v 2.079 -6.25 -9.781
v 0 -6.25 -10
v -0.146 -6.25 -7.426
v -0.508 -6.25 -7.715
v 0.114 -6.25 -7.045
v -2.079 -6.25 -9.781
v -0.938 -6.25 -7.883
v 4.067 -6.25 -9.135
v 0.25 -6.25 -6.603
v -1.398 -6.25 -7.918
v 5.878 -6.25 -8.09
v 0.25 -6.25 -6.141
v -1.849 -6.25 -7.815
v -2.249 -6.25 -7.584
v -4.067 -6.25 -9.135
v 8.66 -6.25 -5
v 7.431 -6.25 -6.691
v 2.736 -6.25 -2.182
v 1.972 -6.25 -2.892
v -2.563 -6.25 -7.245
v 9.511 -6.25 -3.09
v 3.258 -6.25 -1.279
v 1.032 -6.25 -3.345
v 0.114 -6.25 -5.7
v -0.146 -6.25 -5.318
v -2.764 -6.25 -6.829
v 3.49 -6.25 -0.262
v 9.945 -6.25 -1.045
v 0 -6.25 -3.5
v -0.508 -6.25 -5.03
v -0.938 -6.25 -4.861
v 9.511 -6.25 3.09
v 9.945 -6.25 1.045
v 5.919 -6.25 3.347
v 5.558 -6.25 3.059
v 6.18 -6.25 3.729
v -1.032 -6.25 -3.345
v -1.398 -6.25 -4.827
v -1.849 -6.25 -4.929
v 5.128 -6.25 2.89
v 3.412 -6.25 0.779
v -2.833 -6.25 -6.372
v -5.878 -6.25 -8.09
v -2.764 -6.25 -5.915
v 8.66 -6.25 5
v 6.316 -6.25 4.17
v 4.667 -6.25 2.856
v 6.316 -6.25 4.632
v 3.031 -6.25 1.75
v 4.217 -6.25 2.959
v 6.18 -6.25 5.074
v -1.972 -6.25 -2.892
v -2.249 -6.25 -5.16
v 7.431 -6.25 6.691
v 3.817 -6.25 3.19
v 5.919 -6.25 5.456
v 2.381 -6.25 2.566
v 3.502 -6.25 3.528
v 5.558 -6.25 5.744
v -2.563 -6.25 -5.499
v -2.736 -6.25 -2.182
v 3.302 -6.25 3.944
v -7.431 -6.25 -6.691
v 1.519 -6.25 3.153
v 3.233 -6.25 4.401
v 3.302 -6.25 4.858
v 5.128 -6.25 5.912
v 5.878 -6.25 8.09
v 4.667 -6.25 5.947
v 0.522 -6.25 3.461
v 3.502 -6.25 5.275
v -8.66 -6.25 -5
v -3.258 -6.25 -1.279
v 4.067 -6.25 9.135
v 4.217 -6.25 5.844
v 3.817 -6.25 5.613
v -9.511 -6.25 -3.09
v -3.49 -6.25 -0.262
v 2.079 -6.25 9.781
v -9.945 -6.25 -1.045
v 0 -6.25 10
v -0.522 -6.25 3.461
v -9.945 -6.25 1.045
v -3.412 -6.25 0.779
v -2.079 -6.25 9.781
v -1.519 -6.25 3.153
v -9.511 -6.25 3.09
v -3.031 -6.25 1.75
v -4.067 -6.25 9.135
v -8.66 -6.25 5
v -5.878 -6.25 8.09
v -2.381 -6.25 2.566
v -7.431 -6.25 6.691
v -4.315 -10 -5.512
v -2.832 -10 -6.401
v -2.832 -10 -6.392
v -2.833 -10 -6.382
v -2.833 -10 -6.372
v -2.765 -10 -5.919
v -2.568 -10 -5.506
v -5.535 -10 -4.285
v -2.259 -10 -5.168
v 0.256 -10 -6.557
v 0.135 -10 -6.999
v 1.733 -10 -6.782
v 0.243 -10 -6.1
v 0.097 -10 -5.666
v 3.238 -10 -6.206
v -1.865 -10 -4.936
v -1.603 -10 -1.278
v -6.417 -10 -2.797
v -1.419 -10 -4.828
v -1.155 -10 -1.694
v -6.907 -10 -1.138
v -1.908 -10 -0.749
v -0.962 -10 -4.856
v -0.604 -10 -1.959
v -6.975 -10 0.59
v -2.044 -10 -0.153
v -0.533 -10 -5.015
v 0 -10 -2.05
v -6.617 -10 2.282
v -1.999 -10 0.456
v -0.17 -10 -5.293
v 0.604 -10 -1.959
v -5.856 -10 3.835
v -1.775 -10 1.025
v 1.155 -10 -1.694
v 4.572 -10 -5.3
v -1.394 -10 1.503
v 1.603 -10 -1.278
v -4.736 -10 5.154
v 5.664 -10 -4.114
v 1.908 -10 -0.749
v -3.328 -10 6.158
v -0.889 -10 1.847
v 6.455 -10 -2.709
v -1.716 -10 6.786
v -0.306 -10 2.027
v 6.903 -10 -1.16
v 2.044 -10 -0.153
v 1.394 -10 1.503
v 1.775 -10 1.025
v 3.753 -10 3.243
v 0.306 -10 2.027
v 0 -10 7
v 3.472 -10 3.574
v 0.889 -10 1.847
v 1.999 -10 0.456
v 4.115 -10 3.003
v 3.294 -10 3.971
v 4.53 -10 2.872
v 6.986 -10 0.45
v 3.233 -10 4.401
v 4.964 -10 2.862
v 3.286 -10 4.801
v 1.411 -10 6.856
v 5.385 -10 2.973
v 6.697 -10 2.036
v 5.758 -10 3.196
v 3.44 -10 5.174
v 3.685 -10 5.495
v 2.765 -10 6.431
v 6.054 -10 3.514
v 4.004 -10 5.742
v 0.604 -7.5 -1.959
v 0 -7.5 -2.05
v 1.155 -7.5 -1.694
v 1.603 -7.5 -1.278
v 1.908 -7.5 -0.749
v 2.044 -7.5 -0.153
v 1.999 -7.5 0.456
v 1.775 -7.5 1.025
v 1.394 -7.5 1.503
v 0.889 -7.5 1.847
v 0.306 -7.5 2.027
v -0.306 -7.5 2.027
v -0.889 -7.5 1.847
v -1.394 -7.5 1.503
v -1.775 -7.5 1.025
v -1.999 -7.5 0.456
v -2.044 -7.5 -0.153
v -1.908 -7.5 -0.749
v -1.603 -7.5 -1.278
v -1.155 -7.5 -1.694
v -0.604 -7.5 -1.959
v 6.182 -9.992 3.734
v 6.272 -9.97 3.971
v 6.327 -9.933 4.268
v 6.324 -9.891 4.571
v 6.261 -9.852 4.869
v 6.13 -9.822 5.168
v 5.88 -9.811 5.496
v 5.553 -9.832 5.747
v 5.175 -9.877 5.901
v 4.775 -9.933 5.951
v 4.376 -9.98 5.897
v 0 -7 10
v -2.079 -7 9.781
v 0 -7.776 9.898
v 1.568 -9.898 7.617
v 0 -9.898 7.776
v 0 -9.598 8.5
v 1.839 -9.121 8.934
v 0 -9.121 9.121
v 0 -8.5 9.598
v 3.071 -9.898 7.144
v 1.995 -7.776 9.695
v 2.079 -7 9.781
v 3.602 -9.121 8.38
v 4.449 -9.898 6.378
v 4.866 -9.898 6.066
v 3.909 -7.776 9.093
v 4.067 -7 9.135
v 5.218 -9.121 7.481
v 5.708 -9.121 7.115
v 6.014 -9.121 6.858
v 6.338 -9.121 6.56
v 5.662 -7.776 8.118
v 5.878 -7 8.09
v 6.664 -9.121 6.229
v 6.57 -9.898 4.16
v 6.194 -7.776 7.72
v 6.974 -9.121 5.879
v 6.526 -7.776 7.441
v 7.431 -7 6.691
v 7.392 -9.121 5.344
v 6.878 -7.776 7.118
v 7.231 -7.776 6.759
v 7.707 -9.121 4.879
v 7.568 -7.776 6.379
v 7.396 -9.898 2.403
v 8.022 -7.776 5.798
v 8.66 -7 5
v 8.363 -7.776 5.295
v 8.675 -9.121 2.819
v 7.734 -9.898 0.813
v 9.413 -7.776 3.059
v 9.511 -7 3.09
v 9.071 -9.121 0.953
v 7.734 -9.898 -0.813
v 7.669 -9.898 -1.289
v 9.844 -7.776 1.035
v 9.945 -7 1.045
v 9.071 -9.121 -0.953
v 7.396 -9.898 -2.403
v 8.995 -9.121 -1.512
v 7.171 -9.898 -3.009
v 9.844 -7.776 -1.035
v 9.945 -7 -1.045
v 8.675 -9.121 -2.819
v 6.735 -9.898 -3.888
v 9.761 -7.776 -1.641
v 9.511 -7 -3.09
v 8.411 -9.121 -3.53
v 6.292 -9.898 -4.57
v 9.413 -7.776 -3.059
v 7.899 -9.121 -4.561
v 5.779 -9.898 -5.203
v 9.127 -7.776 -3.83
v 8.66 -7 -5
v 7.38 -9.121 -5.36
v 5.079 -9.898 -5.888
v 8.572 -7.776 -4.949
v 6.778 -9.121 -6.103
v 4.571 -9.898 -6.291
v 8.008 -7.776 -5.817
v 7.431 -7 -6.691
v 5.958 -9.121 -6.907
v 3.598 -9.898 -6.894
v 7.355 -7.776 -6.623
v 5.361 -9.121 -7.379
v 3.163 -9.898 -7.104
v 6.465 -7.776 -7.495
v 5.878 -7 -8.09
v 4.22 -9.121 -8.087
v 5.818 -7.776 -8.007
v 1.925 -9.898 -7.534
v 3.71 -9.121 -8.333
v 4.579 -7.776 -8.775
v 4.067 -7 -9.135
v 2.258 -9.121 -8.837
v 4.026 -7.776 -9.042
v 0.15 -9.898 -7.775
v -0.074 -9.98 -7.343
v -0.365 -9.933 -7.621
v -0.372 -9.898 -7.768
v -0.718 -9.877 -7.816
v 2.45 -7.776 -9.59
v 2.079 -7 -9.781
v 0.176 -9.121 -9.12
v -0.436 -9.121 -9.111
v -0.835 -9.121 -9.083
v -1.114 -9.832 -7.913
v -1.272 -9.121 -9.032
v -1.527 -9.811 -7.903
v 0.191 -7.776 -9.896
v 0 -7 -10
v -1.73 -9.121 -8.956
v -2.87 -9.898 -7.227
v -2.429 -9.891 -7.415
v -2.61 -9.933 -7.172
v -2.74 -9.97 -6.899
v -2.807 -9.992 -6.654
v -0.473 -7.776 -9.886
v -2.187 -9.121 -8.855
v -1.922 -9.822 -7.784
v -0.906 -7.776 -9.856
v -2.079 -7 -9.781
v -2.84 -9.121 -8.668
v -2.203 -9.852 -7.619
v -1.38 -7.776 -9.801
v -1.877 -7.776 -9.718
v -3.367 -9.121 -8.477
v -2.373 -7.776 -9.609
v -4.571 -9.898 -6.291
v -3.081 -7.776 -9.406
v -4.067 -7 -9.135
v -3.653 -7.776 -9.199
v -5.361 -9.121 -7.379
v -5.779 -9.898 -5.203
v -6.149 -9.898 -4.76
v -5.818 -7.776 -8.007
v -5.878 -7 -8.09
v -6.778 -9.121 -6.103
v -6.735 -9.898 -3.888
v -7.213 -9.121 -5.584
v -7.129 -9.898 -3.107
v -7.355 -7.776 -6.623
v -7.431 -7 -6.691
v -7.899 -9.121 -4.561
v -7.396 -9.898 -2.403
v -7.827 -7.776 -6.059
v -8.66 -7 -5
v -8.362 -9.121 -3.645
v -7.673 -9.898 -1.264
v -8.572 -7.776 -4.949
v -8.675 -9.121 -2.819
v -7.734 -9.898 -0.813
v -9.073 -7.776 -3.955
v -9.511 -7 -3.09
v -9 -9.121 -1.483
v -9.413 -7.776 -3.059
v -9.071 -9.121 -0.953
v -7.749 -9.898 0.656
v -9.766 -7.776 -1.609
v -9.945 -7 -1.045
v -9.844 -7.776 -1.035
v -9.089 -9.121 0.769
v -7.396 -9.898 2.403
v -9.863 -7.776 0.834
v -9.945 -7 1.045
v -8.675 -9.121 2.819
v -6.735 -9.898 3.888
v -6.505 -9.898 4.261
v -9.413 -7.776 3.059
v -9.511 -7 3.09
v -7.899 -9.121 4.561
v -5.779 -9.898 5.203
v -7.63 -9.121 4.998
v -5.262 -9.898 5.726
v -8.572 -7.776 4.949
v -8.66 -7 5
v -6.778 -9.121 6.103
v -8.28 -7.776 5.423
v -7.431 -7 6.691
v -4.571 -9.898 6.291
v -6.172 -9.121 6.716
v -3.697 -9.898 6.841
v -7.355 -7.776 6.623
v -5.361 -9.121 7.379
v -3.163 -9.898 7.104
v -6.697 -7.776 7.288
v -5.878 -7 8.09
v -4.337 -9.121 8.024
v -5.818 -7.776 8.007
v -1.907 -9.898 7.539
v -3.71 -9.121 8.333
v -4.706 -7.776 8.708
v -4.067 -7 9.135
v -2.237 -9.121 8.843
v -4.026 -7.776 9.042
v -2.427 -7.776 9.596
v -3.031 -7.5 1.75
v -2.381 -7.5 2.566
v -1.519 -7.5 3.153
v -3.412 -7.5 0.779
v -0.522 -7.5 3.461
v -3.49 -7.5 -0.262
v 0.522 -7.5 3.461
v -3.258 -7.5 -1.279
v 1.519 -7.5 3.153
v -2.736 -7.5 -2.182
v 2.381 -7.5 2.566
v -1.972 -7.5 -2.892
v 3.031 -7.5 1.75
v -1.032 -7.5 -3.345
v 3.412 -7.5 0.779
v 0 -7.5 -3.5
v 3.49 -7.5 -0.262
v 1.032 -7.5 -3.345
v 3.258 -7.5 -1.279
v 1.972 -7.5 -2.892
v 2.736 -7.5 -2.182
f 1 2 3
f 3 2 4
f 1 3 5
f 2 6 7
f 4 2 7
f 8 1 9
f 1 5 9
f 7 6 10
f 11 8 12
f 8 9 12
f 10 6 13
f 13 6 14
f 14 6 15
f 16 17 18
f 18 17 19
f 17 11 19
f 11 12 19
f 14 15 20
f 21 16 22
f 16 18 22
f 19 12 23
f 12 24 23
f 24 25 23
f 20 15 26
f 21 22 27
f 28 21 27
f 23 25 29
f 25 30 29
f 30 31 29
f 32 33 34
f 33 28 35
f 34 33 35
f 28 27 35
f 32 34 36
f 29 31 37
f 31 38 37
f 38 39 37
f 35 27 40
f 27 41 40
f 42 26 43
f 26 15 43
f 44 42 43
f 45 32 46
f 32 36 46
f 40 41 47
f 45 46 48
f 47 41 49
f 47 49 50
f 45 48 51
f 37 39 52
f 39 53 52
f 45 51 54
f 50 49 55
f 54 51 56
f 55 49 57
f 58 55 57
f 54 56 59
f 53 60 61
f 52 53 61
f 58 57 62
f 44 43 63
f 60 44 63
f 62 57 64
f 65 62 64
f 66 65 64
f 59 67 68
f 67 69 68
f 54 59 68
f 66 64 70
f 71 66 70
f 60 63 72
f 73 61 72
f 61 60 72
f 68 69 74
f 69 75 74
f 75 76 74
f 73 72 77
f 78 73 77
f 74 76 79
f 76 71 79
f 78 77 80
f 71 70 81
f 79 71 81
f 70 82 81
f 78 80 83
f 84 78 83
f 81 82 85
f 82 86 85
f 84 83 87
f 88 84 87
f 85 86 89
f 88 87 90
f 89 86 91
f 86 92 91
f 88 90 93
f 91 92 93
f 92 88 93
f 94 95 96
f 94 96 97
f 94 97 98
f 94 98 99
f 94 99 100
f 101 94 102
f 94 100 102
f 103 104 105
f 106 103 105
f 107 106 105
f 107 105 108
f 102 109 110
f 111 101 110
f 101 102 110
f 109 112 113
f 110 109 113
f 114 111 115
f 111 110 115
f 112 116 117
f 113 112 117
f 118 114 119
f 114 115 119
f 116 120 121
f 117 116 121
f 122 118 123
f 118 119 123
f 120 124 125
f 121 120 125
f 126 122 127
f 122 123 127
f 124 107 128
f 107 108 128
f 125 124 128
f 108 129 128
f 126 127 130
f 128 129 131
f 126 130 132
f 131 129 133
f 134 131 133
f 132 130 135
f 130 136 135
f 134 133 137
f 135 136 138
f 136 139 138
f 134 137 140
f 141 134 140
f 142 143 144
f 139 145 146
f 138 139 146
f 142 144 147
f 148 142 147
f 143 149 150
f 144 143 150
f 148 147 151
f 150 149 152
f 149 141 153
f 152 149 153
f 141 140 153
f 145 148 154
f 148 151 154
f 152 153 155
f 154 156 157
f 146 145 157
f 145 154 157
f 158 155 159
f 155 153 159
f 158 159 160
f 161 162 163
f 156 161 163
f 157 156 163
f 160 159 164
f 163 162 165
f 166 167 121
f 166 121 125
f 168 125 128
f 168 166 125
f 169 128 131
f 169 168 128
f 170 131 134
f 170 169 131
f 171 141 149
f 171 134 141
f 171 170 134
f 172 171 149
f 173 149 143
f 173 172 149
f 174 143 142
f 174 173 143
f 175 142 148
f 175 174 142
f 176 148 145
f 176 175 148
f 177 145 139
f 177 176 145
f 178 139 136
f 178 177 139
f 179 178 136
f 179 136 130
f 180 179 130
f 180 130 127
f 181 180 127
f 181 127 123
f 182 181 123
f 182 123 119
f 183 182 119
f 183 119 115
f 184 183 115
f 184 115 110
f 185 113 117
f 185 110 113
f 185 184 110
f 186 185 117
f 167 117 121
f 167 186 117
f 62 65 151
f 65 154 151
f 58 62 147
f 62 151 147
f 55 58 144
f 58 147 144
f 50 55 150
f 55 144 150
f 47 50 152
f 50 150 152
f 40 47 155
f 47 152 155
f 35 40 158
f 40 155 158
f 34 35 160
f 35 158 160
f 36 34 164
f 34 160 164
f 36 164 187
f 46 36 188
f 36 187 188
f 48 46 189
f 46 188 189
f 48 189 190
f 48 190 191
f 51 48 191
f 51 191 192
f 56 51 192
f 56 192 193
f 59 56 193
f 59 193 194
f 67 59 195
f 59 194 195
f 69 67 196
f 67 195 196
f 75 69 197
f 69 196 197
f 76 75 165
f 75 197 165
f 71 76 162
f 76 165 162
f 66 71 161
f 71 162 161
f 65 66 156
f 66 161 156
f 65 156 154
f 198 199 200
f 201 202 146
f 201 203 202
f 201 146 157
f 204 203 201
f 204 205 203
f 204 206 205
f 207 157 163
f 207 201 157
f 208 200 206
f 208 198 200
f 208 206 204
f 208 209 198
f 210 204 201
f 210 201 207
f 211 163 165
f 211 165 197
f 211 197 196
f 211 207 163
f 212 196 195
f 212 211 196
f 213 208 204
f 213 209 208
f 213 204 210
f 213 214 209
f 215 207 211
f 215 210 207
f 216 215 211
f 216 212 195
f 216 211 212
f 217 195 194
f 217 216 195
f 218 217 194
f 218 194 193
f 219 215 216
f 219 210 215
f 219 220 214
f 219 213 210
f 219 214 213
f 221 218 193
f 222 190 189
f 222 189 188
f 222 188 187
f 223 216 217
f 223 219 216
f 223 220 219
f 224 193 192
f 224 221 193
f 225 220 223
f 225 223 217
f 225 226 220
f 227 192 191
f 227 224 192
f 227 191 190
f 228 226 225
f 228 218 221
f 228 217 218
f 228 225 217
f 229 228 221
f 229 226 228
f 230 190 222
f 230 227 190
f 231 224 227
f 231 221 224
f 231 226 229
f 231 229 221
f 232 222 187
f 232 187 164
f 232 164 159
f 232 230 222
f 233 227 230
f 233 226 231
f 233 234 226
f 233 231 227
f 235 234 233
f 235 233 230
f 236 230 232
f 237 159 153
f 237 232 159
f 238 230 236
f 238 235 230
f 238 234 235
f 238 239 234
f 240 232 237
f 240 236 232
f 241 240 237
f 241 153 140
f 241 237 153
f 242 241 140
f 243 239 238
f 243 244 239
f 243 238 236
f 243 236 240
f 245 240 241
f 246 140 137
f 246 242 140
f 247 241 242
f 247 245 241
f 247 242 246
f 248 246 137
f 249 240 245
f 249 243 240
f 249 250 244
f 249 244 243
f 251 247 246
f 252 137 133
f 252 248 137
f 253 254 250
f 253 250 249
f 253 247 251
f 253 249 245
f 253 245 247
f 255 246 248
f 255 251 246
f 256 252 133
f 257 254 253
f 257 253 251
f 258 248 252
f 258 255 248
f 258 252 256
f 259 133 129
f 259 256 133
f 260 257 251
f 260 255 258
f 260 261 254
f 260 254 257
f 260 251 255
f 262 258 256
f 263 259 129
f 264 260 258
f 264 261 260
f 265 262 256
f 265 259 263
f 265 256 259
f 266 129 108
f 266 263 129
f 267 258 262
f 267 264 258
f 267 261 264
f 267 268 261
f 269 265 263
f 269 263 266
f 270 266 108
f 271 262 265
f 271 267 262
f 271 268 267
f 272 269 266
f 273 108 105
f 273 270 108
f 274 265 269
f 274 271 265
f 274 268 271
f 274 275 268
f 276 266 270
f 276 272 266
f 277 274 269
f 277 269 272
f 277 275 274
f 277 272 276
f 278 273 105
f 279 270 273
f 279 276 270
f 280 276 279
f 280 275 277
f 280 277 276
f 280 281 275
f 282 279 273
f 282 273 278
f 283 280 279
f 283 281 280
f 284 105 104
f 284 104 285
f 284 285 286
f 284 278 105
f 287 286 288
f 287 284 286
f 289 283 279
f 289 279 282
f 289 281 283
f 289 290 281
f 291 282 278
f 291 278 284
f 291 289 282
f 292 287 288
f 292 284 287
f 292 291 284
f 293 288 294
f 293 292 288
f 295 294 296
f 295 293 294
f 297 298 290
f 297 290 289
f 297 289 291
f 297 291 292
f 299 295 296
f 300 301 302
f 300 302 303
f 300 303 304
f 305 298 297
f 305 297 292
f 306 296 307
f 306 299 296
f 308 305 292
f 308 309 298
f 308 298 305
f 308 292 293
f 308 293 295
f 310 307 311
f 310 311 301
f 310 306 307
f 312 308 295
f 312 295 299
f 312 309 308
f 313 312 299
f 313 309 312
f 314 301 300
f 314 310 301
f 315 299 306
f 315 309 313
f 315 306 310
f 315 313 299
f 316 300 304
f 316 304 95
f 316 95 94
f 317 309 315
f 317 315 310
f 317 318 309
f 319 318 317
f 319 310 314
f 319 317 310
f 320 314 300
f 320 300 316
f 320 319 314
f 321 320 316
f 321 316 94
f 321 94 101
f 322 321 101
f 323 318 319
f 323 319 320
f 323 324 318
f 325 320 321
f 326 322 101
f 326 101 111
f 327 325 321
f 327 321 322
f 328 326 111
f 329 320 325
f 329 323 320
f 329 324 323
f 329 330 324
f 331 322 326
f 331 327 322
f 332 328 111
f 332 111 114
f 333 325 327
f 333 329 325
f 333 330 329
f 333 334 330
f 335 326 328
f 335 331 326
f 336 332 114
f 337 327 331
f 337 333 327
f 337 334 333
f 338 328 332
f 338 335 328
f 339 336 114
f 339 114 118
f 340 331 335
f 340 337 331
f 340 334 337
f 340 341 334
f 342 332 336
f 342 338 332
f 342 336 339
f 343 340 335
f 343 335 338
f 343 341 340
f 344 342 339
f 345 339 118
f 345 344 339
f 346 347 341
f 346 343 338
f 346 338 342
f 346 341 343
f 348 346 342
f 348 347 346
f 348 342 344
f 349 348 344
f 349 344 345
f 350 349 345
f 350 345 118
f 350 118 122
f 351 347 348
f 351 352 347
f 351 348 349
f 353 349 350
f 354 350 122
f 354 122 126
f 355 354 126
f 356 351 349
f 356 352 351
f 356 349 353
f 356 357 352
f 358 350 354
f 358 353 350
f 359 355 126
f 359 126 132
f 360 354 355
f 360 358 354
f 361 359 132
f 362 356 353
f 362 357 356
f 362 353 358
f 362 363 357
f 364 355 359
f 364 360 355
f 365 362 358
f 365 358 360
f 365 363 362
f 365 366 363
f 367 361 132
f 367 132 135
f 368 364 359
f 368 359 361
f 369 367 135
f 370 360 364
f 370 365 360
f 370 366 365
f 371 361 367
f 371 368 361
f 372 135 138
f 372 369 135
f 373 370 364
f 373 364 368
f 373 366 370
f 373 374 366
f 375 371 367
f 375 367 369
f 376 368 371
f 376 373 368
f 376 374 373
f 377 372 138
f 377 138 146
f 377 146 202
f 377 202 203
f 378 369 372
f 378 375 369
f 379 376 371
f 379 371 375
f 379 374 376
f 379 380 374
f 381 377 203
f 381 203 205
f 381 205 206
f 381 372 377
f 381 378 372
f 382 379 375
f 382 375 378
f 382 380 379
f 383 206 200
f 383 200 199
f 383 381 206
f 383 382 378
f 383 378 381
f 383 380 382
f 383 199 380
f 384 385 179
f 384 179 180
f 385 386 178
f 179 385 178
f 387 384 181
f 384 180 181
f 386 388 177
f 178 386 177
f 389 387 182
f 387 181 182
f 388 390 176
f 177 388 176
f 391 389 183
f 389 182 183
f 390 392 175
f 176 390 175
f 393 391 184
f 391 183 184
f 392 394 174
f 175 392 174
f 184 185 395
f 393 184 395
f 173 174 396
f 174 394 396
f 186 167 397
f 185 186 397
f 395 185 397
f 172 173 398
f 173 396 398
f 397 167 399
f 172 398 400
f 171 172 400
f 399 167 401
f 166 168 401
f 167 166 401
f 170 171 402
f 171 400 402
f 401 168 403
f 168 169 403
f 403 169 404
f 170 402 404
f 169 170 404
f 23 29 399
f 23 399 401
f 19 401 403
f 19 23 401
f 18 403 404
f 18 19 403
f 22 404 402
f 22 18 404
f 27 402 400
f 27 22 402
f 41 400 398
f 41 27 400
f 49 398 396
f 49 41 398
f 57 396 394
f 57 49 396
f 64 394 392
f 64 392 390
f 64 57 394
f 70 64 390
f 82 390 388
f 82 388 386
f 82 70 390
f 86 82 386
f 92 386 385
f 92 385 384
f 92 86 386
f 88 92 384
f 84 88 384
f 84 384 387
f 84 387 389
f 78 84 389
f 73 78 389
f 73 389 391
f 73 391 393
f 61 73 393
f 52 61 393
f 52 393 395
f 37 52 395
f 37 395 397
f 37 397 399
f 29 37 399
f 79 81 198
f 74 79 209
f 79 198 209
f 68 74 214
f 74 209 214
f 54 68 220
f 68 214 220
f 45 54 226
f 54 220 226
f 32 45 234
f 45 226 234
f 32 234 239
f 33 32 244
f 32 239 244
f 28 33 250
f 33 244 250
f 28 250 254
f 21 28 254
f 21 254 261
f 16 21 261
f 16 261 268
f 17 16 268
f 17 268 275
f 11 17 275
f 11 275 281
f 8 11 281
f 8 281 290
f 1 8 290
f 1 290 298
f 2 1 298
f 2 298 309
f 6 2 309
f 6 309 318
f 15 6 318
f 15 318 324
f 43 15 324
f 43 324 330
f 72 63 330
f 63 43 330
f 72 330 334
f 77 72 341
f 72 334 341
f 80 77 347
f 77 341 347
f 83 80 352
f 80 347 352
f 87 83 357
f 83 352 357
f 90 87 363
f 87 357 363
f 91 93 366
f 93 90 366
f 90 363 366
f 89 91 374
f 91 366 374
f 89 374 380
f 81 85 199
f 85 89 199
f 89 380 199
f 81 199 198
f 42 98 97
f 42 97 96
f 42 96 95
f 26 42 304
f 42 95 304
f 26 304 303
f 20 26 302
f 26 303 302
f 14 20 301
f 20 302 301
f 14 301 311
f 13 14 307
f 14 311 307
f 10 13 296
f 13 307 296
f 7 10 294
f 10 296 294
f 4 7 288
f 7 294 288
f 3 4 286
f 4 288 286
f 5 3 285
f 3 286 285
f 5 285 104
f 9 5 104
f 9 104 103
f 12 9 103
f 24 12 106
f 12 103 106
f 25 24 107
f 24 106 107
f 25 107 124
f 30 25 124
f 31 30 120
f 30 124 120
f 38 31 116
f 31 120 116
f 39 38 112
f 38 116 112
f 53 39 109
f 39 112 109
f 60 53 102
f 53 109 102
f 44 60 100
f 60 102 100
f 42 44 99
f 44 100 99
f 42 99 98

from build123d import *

# Parameters (mm, degrees)
BOSS_EXTRUDE1_DEPTH        = 3
BOSS_EXTRUDE1_DEPTH_BACK   = 10
SKETCH1_R                  = 10
SKETCH4_R                  = 1.5
HOLE_DEPTH                 = 20.973741561
HOLECIR_COUNT              = 5
SKETCH6_R                  = 3.5
BEARINGHOLE_DEPTH          = 2.5
SKETCH7_R                  = 2.05
SHAFTHOLE_DEPTH            = 17.248076982
F_3_1_3_1_DIAMETER_HOLE1_D = 3.1
FILLET2_R                  = 3
SKETCH11_R                 = 10
CUT_EXTRUDE1_DEPTH         = 10


with BuildPart() as part:
    # Sketch1 → Boss-Extrude1 (new, two sides: drawn at the far end of the back side and taken through both)
    with BuildSketch(Plane(origin=(0, 0, 0), x_dir=(1, 0, 0), z_dir=(0, 1, 0)).offset(-BOSS_EXTRUDE1_DEPTH_BACK)):
        with Locations(Location((0, 0, 0), (0, 0, 270))):
            Circle(SKETCH1_R)
    extrude(amount=BOSS_EXTRUDE1_DEPTH + BOSS_EXTRUDE1_DEPTH_BACK)

    # Sketch4 → hole (cut, through all)
    with BuildSketch(Plane(origin=(-3.352872105, -1.093066116, 1.887711608), x_dir=(-0.4486862613641547, -0.14627571033740308, -0.8816371449912632), z_dir=(0.8382180262940947, 0.2732665289126682, -0.47192790187872385))):
        with Locations(Location((0, 0, 0), (0, 0, 8.746528197))):
            Circle(SKETCH4_R)
    hole = extrude(amount=-HOLE_DEPTH, mode=Mode.SUBTRACT)

    # holecir: hole ×5 about axis
    holecir_axis = Axis((0, 0, 0), (0, 1, 0))
    for i in range(1, HOLECIR_COUNT):
        add(hole.rotate(holecir_axis, i * 360 / HOLECIR_COUNT), mode=Mode.SUBTRACT)

    # Sketch6 → bearinghole (cut)
    with BuildSketch(Plane(origin=(0, -5, 0), x_dir=(-1, 0, 0), z_dir=(0, -1, 0))):
        with Locations(Location((0, 0, 0), (0, 0, 90))):
            Circle(SKETCH6_R)
    extrude(amount=BEARINGHOLE_DEPTH, mode=Mode.SUBTRACT)

    # Sketch7 → shafthole (cut, through all)
    with BuildSketch(Plane(origin=(0, -5, 0), x_dir=(-1, 0, 0), z_dir=(0, -1, 0))):
        with Locations(Location((0, 0, 0), (0, 0, 90))):
            Circle(SKETCH7_R)
    extrude(amount=SHAFTHOLE_DEPTH, mode=Mode.SUBTRACT)

    # Ø3.1 (3.1) Diameter Hole1 (through all)
    with Locations(Plane(origin=(0, 3, 0), x_dir=(1, 0, 0), z_dir=(0, 1, 0))):
        with Locations((-1.282558474, 6.372208703), (4.783101903, -4.401356176)):
            Hole(F_3_1_3_1_DIAMETER_HOLE1_D / 2)

    # Fillet2
    # the kernel refuses this fillet: 3 mm, written as the material it takes off along each edge
    with BuildSketch(Plane(origin=(0, 3, 0), x_dir=(0, 0, 1), z_dir=(-1, 0, 0))) as fillet2_piece_1:
        with BuildLine():
            CenterArc((10 - FILLET2_R, -FILLET2_R), FILLET2_R, 0, 90)
            Line((10 - FILLET2_R, 0), (10, 0))
            Line((10, 0), (10, -FILLET2_R))
        make_face()
    revolve(axis=Axis((0, 3, 0), (0, 1, 0)), mode=Mode.SUBTRACT)
    with BuildSketch(Plane(origin=(0, -10, 0), x_dir=(0, 0, 1), z_dir=(-1, 0, 0))) as fillet2_piece_2:
        with BuildLine():
            CenterArc((10 - FILLET2_R, FILLET2_R), FILLET2_R, 270, 90)
            Line((10 - FILLET2_R, 0), (10, 0))
            Line((10, 0), (10, FILLET2_R))
        make_face()
    revolve(axis=Axis((0, -10, 0), (0, 1, 0)), mode=Mode.SUBTRACT)

    # Sketch11 → Cut-Extrude1 (cut)
    with BuildSketch(Plane(origin=(0, -6.25, 0), x_dir=(-1, 0, 0), z_dir=(0, -1, 0))):
        with Locations(Location((0, 0, 0), (0, 0, 270))):
            Circle(SKETCH11_R)
    extrude(amount=-CUT_EXTRUDE1_DEPTH, mode=Mode.SUBTRACT)


solid = part.part
